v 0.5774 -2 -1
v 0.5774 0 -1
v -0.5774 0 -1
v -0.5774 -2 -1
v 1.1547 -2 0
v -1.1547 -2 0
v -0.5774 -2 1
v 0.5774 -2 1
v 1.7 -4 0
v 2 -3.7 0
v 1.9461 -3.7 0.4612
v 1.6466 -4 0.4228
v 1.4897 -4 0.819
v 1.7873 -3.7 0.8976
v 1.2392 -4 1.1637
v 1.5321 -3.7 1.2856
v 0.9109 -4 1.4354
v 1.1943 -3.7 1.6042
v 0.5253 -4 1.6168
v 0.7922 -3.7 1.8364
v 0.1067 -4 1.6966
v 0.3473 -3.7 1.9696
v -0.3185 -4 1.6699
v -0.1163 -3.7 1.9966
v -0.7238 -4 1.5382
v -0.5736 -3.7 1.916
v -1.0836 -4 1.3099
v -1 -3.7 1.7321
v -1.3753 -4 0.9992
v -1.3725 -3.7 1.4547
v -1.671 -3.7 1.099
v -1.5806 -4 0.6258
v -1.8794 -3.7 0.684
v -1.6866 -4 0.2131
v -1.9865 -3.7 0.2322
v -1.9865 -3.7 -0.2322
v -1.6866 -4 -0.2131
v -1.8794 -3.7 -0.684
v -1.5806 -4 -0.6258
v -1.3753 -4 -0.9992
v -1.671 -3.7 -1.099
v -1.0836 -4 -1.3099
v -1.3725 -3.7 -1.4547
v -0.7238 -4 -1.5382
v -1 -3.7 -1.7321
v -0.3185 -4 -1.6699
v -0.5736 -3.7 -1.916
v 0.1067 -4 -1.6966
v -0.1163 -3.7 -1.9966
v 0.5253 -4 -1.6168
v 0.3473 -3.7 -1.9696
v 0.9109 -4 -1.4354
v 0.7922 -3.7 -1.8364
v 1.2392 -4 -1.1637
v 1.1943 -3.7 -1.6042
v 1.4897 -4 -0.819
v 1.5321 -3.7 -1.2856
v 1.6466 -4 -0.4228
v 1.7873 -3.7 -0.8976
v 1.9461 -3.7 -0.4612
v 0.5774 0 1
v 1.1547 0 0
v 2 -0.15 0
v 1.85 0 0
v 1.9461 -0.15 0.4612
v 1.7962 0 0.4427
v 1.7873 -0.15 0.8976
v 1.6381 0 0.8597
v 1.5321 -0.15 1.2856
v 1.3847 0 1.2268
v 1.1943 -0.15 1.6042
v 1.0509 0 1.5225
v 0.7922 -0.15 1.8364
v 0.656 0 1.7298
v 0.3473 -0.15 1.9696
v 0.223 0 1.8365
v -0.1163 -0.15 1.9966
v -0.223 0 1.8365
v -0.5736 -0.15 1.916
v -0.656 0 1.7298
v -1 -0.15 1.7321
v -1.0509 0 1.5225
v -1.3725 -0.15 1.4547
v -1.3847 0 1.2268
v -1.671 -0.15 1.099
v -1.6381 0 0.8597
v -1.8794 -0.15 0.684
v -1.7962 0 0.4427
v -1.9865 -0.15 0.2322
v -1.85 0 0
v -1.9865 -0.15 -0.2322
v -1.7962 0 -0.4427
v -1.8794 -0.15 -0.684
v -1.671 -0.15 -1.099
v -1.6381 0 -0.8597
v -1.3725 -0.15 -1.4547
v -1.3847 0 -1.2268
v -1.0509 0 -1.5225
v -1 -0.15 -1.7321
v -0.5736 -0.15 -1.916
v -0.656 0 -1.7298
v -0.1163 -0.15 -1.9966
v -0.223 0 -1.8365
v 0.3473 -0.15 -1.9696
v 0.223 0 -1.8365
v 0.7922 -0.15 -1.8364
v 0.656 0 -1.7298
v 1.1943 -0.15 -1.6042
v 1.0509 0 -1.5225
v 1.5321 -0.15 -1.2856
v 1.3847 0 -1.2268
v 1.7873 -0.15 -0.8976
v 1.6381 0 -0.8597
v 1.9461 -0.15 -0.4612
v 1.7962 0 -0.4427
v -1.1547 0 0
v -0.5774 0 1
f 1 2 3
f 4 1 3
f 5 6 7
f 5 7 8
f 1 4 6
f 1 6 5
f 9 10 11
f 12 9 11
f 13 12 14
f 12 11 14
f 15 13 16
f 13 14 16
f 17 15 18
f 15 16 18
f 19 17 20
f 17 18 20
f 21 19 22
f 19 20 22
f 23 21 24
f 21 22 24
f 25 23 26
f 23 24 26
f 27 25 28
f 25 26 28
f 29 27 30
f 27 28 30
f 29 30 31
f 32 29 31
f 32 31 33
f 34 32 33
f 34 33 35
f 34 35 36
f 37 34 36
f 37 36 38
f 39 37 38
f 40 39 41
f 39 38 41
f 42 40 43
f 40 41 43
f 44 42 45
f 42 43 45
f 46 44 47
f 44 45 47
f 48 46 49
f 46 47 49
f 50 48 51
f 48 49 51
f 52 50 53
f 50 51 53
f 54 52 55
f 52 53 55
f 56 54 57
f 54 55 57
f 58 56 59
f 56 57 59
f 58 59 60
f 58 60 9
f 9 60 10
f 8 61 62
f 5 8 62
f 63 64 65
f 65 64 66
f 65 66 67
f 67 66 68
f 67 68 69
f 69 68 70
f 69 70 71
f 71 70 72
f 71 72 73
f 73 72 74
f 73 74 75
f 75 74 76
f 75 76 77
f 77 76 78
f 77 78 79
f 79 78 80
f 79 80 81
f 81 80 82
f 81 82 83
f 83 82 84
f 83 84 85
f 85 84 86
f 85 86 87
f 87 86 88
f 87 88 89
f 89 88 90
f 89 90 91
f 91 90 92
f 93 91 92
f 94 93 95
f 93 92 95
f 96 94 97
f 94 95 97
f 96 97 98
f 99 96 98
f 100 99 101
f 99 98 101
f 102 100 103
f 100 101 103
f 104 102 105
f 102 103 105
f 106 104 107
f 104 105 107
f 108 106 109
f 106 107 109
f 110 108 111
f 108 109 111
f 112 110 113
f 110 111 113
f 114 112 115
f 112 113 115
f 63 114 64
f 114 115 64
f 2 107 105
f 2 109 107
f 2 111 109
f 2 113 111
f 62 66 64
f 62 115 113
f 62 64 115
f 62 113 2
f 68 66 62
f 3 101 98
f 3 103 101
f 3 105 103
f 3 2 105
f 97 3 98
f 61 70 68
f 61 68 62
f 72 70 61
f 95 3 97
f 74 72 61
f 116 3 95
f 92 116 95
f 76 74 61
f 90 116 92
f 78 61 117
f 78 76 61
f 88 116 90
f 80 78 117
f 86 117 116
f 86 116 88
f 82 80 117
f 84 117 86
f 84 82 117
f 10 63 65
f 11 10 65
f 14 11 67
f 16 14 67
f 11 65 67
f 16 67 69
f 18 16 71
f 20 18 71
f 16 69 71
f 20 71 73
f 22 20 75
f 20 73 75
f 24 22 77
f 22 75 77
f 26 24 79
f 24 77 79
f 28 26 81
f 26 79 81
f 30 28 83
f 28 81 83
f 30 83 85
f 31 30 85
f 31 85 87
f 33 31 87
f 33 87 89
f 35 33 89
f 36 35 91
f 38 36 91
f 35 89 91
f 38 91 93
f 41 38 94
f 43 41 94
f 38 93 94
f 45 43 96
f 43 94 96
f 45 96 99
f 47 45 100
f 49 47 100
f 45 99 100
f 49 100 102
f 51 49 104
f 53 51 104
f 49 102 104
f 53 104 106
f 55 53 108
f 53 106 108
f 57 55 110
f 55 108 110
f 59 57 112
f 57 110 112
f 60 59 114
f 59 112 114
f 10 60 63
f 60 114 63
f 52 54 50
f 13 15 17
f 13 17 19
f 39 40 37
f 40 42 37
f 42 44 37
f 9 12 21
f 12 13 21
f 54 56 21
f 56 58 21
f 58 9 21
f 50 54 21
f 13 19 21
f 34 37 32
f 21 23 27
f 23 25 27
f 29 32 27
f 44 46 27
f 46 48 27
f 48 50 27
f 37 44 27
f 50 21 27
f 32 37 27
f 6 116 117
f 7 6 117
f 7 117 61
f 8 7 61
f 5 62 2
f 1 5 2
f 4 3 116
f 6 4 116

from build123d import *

# Parameters (mm, degrees)
CROQUIS1_W            = 2
CROQUIS1_H            = 4
CORTAR_EXTRUIR2_DEPTH = 2
CHAFL_N3_SIZE         = 0.3
CHAFL_N4_SIZE         = 0.15


with BuildPart() as part:
    # Croquis1 → Revolución1 (revolve)
    with BuildSketch(Plane.XY):
        with Locations((1, -2)):
            Rectangle(CROQUIS1_W, CROQUIS1_H)
    revolve(axis=Axis((0, 0, 0), (0, -1, 0)))

    # Croquis3 → Cortar-Extruir2 (cut)
    with BuildSketch(Plane(origin=(0, 0, 0), x_dir=(1, 0, 0), z_dir=(0, 1, 0))):
        Polygon((-0.577350269, 1), (-1.154700538, 0), (-0.577350269, -1), (0.577350269, -1), (1.154700538, 0), (0.577350269, 1), align=None)
    extrude(amount=-CORTAR_EXTRUIR2_DEPTH, mode=Mode.SUBTRACT)

    # Chaflán3
    chafl_n3_edges = [part.edges().sort_by_distance(p)[0] for p in [
        (-2, -4, 0),
    ]]
    chamfer(chafl_n3_edges, length=CHAFL_N3_SIZE)

    # Chaflán4
    chafl_n4_edges = [part.edges().sort_by_distance(p)[0] for p in [
        (-2, 0, 0),
    ]]
    chamfer(chafl_n4_edges, length=CHAFL_N4_SIZE)


solid = part.part
